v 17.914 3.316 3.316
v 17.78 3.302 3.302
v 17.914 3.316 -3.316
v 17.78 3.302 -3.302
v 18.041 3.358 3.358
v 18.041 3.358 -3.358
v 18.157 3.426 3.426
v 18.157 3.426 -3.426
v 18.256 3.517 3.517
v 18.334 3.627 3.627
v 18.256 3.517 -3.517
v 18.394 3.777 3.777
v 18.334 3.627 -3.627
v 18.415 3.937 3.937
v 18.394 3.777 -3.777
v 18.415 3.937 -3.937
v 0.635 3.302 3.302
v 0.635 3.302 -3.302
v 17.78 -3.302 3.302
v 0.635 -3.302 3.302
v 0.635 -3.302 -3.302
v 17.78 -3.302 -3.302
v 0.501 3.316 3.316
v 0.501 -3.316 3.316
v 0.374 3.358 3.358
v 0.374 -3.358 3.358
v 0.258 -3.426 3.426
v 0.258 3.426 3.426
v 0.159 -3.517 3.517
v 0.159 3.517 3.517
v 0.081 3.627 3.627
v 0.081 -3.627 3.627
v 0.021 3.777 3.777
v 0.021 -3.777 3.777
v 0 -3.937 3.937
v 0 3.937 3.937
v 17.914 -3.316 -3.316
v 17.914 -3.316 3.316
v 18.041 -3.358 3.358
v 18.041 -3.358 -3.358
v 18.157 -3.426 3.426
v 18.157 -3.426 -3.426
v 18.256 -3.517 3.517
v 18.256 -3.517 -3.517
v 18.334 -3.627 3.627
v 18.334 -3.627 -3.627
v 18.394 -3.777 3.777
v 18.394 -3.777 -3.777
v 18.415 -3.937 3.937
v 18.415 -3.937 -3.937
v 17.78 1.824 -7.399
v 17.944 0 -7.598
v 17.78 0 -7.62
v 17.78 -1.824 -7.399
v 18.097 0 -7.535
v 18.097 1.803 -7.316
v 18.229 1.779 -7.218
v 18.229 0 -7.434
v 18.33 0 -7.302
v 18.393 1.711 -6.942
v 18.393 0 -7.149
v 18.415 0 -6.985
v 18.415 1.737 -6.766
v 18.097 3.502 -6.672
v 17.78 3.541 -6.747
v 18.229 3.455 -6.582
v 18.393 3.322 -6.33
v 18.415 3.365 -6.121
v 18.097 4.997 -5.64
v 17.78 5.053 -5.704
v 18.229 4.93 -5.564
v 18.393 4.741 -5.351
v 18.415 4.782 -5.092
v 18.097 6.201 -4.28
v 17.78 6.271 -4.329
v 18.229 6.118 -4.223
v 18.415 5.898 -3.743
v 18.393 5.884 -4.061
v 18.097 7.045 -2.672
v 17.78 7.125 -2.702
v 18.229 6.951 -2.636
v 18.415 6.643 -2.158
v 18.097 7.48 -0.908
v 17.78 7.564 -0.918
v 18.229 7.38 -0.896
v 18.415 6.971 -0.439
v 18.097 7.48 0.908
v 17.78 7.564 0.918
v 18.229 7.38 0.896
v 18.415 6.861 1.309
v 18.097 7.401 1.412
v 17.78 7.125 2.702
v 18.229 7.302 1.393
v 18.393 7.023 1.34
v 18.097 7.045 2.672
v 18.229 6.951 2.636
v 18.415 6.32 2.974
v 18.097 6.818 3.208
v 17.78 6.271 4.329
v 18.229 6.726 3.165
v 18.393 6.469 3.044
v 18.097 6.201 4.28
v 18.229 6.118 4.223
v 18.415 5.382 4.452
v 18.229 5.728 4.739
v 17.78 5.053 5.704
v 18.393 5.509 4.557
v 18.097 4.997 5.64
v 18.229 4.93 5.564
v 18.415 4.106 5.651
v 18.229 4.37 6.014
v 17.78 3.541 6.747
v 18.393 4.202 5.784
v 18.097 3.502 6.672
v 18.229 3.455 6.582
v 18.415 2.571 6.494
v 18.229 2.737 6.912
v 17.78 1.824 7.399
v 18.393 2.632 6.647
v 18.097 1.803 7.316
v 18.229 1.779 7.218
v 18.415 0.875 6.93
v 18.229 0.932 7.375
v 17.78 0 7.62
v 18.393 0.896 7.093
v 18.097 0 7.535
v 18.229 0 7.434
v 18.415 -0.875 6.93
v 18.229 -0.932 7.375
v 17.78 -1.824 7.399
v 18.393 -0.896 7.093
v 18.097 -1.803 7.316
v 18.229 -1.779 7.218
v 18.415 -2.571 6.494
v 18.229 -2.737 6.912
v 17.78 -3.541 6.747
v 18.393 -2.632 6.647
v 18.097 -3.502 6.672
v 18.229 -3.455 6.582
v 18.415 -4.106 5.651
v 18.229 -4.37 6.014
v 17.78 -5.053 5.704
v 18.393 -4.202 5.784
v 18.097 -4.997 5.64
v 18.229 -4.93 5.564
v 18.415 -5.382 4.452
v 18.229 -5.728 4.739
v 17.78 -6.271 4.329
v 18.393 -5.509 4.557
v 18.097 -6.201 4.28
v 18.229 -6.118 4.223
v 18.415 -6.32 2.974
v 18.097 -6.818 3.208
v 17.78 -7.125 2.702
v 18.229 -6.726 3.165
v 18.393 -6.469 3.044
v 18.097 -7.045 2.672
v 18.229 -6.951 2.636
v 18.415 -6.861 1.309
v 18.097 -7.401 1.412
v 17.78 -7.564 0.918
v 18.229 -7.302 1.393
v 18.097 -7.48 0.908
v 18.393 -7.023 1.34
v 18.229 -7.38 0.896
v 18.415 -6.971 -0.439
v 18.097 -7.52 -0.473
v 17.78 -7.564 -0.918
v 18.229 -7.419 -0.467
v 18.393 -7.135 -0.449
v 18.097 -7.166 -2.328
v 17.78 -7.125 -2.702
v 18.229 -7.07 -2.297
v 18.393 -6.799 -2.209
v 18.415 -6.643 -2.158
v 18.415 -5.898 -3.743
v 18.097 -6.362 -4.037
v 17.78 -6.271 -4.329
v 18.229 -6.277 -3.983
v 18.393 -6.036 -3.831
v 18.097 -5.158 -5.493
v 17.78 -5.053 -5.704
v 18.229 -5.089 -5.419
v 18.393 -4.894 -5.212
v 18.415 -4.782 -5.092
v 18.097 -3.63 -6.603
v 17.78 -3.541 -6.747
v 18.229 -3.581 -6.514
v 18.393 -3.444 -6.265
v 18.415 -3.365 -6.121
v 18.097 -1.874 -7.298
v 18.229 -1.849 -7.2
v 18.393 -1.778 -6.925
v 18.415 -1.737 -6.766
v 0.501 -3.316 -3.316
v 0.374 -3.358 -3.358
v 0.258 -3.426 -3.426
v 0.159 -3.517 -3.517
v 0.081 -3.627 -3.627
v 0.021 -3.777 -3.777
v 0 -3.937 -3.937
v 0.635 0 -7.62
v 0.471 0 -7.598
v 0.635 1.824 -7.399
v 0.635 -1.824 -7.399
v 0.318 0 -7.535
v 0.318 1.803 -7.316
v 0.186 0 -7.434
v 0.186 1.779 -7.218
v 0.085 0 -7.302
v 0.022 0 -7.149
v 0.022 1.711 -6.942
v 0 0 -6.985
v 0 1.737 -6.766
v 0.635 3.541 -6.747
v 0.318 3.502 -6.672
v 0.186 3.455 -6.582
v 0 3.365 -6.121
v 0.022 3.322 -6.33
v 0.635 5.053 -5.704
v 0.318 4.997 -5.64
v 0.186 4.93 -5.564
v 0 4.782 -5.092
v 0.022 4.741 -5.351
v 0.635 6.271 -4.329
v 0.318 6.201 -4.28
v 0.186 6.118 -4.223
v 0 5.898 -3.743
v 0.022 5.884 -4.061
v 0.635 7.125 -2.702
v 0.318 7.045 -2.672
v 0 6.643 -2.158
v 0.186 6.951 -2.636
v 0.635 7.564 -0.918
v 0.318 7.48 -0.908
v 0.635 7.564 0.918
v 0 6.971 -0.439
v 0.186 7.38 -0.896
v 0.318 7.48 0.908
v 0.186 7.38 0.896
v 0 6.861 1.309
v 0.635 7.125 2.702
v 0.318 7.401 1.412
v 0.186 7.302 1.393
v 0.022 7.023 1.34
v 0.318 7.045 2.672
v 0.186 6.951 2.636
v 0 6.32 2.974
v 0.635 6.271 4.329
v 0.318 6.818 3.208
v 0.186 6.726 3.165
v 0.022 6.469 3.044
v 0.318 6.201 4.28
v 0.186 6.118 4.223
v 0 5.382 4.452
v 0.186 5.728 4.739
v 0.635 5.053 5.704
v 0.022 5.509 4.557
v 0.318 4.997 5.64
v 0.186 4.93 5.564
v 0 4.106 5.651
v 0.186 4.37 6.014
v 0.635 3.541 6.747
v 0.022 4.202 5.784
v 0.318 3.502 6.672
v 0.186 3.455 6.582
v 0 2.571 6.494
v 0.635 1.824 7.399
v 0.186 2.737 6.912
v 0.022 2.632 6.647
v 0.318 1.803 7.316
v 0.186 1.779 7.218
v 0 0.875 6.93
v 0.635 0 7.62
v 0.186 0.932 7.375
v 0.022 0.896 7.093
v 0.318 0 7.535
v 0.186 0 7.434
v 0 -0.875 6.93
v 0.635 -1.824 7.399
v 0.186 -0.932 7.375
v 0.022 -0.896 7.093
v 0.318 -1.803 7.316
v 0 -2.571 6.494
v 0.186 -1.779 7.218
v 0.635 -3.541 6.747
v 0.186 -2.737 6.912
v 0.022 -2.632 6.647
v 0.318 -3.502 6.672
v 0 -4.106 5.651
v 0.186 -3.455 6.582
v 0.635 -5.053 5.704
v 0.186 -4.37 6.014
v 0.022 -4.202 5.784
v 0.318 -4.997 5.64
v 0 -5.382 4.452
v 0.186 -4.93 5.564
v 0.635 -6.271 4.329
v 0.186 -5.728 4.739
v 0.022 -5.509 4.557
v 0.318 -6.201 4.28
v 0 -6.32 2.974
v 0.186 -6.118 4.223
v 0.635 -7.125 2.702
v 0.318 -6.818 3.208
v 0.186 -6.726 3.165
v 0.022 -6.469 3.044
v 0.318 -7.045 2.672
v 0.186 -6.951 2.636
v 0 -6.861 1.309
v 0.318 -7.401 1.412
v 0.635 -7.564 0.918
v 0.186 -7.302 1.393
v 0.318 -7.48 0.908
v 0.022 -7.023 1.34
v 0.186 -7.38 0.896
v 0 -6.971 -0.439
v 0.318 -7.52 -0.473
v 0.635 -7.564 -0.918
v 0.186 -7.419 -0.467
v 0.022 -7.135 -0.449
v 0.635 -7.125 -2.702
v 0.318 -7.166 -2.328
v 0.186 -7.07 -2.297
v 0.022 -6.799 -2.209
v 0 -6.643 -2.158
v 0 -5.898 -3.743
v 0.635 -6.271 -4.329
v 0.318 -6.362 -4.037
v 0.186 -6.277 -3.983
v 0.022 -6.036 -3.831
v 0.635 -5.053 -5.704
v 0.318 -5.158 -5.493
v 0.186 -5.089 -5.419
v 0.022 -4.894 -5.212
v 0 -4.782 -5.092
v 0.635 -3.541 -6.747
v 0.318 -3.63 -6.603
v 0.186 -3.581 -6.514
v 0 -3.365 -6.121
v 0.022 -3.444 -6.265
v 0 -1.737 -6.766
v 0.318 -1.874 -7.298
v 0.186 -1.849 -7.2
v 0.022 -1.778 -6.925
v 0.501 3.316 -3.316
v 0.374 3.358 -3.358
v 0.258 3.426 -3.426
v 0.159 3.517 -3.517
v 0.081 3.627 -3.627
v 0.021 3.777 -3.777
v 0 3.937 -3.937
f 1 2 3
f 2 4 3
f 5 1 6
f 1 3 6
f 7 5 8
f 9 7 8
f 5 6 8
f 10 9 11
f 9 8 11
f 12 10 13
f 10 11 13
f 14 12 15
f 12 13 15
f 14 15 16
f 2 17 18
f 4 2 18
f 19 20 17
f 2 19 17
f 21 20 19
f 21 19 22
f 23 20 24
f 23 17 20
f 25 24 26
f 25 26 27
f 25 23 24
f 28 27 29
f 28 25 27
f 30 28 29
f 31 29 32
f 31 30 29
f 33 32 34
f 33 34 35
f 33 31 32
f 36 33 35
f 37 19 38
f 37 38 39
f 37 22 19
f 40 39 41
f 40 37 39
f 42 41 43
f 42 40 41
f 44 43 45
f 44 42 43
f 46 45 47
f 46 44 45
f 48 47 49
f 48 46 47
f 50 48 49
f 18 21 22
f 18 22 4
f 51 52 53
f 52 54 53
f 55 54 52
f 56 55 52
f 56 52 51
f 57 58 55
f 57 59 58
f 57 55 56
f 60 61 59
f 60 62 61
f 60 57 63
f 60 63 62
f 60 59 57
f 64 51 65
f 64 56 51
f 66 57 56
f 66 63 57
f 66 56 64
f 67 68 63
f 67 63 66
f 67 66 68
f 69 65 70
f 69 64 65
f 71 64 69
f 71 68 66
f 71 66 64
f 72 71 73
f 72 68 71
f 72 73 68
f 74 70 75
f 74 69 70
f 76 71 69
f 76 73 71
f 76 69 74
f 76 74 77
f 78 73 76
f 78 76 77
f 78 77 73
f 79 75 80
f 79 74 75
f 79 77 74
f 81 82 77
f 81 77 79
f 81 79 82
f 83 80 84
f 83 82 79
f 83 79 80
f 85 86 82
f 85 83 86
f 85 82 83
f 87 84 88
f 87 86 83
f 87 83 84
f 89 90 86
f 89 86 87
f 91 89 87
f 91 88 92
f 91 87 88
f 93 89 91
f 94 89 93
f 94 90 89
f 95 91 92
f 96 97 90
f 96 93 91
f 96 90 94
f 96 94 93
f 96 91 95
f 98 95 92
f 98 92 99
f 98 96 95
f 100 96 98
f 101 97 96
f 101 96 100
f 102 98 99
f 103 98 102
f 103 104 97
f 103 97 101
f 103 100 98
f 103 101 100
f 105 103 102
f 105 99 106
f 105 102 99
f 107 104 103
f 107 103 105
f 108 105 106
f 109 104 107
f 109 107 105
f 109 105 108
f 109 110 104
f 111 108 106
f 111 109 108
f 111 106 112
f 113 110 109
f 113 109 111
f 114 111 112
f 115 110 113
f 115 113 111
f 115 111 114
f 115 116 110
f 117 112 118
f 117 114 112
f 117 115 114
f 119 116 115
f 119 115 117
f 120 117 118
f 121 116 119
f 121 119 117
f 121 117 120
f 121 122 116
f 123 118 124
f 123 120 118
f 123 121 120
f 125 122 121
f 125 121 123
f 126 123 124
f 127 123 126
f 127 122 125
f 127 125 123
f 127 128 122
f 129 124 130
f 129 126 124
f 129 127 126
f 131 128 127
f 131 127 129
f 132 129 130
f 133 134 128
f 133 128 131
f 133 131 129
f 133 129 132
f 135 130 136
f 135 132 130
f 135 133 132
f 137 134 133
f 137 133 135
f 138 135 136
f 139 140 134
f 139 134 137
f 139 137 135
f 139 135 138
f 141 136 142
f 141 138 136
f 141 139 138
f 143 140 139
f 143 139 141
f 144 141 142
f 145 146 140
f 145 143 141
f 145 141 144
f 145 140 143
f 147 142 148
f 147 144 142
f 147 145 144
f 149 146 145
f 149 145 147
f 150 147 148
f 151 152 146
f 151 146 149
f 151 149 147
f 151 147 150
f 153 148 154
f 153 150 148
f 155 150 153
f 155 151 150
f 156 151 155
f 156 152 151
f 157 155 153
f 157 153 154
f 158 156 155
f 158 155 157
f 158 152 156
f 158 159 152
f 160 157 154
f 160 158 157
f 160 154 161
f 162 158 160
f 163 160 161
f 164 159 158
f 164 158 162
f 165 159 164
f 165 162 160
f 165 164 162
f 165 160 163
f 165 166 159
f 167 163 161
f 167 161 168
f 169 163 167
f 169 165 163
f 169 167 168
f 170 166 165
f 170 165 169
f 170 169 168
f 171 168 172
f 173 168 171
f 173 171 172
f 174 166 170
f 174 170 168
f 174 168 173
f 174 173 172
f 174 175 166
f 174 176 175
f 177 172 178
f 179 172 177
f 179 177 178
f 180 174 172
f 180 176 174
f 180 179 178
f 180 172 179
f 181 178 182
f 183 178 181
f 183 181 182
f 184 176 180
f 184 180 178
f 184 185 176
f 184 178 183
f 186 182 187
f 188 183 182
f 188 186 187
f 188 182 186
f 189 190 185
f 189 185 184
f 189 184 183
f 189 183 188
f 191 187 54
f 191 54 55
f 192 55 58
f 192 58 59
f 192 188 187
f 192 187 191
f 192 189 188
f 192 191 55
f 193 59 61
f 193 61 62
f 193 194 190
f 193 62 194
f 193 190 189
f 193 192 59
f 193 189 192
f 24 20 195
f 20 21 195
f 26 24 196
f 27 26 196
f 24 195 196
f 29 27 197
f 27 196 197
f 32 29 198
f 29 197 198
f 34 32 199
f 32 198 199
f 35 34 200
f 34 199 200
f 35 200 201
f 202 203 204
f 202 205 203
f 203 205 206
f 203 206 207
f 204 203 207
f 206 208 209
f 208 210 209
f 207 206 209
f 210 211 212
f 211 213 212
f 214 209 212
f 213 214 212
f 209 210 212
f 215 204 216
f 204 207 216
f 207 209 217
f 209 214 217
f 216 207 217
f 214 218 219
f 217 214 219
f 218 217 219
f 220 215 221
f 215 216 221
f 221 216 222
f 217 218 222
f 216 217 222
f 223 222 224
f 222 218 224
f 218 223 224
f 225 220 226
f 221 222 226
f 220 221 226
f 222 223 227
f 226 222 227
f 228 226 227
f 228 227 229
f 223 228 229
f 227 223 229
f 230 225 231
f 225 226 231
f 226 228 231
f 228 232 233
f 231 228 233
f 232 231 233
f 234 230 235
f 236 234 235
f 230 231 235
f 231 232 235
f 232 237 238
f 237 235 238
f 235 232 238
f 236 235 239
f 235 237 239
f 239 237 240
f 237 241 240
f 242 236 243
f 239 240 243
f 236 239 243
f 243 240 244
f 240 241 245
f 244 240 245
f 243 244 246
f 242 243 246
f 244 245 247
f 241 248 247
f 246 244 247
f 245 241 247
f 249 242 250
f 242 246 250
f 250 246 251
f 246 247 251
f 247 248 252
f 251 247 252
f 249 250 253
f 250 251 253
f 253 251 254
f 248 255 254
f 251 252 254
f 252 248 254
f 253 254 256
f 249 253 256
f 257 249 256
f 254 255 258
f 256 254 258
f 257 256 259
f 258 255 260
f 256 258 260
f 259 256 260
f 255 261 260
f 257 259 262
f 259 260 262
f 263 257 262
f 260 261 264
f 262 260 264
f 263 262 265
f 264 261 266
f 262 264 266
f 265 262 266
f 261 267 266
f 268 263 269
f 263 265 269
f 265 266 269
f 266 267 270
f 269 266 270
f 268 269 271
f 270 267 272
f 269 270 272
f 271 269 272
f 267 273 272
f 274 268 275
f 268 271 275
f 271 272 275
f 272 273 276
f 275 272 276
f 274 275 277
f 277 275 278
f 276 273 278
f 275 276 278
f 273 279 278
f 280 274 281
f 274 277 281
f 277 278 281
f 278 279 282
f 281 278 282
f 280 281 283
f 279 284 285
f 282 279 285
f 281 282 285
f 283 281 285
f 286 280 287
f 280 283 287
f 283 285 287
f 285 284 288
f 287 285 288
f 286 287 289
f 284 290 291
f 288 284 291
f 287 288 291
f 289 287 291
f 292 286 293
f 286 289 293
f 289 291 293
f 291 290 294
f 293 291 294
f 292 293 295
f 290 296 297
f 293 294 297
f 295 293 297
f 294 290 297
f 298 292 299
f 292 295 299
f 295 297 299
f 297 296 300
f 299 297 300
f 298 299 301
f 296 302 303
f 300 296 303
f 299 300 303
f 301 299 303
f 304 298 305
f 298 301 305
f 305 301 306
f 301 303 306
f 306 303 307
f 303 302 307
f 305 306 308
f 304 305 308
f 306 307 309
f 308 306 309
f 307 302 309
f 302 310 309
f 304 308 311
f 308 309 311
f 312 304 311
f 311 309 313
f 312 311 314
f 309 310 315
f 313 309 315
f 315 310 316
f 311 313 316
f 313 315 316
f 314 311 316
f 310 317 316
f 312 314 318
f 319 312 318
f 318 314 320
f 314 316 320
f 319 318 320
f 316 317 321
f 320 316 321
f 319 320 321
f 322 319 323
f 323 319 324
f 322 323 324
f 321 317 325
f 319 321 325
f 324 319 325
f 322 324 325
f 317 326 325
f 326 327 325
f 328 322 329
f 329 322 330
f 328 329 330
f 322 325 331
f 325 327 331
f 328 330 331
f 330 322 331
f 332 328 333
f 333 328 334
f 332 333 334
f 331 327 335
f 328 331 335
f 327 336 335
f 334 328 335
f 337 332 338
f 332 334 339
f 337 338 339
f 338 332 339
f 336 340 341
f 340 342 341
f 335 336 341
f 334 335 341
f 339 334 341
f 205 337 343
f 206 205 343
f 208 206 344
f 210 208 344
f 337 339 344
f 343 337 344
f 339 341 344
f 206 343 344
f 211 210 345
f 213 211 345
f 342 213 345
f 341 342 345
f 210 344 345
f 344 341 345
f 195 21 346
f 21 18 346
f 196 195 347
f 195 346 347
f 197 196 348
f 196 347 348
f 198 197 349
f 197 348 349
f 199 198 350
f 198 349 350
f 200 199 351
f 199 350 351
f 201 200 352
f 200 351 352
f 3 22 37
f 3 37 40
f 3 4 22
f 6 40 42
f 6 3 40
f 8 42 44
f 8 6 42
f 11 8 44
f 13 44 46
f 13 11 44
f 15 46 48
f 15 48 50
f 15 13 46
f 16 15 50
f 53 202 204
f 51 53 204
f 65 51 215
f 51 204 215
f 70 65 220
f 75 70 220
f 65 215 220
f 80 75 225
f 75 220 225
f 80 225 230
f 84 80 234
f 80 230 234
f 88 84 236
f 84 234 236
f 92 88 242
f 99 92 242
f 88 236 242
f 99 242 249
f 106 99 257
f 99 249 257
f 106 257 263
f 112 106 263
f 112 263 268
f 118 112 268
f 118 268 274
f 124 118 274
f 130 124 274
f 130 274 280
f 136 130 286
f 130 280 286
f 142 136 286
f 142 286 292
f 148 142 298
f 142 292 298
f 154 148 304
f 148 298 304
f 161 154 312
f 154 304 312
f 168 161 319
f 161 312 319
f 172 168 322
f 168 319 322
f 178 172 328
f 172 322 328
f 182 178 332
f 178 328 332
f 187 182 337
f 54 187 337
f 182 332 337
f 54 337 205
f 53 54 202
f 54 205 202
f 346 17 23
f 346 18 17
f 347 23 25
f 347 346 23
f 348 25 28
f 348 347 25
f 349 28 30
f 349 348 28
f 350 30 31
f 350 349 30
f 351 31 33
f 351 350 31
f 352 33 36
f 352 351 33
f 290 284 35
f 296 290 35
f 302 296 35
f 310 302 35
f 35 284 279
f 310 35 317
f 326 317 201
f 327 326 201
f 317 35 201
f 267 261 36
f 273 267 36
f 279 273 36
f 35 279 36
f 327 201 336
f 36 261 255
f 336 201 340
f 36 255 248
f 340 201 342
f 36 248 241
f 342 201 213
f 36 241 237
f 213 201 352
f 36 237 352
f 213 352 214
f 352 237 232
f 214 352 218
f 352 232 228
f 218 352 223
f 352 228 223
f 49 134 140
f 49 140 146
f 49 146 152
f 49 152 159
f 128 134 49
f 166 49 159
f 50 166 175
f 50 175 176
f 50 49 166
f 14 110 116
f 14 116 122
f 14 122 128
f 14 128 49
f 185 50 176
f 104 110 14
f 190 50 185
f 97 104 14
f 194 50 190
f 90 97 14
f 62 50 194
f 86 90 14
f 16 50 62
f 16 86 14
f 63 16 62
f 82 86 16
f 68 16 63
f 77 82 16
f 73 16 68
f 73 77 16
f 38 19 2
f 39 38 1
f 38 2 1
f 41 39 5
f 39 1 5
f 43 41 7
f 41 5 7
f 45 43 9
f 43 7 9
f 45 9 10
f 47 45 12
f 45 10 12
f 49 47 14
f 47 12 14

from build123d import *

# Parameters (mm, degrees)
SKETCH1_R           = 7.62
SKETCH1_W           = 6.604
SKETCH1_H           = 6.604
BOSS_EXTRUDE1_DEPTH = 18.415
FILLET1_R           = 0.635


with BuildPart() as part:
    # Sketch1 → Boss-Extrude1 (new body)
    with BuildSketch(Plane(origin=(0, 0, 0), x_dir=(0, 0, -1), z_dir=(1, 0, 0))):
        Circle(SKETCH1_R)
        Rectangle(SKETCH1_W, SKETCH1_H, mode=Mode.SUBTRACT)
    extrude(amount=BOSS_EXTRUDE1_DEPTH)

    # Fillet1
    fillet1_edges = [part.edges().sort_by_distance(p)[0] for p in [
        (18.415, 0, 3.302),
        (18.415, -3.302, 0),
        (0, 0, 7.62),
        (18.415, 0, 7.62),
        (0, 0, -3.302),
        (0, 3.302, 0),
        (0, 0, 3.302),
        (0, -3.302, 0),
        (18.415, 0, -3.302),
        (18.415, 3.302, 0),
    ]]
    fillet(fillet1_edges, radius=FILLET1_R)


solid = part.part
